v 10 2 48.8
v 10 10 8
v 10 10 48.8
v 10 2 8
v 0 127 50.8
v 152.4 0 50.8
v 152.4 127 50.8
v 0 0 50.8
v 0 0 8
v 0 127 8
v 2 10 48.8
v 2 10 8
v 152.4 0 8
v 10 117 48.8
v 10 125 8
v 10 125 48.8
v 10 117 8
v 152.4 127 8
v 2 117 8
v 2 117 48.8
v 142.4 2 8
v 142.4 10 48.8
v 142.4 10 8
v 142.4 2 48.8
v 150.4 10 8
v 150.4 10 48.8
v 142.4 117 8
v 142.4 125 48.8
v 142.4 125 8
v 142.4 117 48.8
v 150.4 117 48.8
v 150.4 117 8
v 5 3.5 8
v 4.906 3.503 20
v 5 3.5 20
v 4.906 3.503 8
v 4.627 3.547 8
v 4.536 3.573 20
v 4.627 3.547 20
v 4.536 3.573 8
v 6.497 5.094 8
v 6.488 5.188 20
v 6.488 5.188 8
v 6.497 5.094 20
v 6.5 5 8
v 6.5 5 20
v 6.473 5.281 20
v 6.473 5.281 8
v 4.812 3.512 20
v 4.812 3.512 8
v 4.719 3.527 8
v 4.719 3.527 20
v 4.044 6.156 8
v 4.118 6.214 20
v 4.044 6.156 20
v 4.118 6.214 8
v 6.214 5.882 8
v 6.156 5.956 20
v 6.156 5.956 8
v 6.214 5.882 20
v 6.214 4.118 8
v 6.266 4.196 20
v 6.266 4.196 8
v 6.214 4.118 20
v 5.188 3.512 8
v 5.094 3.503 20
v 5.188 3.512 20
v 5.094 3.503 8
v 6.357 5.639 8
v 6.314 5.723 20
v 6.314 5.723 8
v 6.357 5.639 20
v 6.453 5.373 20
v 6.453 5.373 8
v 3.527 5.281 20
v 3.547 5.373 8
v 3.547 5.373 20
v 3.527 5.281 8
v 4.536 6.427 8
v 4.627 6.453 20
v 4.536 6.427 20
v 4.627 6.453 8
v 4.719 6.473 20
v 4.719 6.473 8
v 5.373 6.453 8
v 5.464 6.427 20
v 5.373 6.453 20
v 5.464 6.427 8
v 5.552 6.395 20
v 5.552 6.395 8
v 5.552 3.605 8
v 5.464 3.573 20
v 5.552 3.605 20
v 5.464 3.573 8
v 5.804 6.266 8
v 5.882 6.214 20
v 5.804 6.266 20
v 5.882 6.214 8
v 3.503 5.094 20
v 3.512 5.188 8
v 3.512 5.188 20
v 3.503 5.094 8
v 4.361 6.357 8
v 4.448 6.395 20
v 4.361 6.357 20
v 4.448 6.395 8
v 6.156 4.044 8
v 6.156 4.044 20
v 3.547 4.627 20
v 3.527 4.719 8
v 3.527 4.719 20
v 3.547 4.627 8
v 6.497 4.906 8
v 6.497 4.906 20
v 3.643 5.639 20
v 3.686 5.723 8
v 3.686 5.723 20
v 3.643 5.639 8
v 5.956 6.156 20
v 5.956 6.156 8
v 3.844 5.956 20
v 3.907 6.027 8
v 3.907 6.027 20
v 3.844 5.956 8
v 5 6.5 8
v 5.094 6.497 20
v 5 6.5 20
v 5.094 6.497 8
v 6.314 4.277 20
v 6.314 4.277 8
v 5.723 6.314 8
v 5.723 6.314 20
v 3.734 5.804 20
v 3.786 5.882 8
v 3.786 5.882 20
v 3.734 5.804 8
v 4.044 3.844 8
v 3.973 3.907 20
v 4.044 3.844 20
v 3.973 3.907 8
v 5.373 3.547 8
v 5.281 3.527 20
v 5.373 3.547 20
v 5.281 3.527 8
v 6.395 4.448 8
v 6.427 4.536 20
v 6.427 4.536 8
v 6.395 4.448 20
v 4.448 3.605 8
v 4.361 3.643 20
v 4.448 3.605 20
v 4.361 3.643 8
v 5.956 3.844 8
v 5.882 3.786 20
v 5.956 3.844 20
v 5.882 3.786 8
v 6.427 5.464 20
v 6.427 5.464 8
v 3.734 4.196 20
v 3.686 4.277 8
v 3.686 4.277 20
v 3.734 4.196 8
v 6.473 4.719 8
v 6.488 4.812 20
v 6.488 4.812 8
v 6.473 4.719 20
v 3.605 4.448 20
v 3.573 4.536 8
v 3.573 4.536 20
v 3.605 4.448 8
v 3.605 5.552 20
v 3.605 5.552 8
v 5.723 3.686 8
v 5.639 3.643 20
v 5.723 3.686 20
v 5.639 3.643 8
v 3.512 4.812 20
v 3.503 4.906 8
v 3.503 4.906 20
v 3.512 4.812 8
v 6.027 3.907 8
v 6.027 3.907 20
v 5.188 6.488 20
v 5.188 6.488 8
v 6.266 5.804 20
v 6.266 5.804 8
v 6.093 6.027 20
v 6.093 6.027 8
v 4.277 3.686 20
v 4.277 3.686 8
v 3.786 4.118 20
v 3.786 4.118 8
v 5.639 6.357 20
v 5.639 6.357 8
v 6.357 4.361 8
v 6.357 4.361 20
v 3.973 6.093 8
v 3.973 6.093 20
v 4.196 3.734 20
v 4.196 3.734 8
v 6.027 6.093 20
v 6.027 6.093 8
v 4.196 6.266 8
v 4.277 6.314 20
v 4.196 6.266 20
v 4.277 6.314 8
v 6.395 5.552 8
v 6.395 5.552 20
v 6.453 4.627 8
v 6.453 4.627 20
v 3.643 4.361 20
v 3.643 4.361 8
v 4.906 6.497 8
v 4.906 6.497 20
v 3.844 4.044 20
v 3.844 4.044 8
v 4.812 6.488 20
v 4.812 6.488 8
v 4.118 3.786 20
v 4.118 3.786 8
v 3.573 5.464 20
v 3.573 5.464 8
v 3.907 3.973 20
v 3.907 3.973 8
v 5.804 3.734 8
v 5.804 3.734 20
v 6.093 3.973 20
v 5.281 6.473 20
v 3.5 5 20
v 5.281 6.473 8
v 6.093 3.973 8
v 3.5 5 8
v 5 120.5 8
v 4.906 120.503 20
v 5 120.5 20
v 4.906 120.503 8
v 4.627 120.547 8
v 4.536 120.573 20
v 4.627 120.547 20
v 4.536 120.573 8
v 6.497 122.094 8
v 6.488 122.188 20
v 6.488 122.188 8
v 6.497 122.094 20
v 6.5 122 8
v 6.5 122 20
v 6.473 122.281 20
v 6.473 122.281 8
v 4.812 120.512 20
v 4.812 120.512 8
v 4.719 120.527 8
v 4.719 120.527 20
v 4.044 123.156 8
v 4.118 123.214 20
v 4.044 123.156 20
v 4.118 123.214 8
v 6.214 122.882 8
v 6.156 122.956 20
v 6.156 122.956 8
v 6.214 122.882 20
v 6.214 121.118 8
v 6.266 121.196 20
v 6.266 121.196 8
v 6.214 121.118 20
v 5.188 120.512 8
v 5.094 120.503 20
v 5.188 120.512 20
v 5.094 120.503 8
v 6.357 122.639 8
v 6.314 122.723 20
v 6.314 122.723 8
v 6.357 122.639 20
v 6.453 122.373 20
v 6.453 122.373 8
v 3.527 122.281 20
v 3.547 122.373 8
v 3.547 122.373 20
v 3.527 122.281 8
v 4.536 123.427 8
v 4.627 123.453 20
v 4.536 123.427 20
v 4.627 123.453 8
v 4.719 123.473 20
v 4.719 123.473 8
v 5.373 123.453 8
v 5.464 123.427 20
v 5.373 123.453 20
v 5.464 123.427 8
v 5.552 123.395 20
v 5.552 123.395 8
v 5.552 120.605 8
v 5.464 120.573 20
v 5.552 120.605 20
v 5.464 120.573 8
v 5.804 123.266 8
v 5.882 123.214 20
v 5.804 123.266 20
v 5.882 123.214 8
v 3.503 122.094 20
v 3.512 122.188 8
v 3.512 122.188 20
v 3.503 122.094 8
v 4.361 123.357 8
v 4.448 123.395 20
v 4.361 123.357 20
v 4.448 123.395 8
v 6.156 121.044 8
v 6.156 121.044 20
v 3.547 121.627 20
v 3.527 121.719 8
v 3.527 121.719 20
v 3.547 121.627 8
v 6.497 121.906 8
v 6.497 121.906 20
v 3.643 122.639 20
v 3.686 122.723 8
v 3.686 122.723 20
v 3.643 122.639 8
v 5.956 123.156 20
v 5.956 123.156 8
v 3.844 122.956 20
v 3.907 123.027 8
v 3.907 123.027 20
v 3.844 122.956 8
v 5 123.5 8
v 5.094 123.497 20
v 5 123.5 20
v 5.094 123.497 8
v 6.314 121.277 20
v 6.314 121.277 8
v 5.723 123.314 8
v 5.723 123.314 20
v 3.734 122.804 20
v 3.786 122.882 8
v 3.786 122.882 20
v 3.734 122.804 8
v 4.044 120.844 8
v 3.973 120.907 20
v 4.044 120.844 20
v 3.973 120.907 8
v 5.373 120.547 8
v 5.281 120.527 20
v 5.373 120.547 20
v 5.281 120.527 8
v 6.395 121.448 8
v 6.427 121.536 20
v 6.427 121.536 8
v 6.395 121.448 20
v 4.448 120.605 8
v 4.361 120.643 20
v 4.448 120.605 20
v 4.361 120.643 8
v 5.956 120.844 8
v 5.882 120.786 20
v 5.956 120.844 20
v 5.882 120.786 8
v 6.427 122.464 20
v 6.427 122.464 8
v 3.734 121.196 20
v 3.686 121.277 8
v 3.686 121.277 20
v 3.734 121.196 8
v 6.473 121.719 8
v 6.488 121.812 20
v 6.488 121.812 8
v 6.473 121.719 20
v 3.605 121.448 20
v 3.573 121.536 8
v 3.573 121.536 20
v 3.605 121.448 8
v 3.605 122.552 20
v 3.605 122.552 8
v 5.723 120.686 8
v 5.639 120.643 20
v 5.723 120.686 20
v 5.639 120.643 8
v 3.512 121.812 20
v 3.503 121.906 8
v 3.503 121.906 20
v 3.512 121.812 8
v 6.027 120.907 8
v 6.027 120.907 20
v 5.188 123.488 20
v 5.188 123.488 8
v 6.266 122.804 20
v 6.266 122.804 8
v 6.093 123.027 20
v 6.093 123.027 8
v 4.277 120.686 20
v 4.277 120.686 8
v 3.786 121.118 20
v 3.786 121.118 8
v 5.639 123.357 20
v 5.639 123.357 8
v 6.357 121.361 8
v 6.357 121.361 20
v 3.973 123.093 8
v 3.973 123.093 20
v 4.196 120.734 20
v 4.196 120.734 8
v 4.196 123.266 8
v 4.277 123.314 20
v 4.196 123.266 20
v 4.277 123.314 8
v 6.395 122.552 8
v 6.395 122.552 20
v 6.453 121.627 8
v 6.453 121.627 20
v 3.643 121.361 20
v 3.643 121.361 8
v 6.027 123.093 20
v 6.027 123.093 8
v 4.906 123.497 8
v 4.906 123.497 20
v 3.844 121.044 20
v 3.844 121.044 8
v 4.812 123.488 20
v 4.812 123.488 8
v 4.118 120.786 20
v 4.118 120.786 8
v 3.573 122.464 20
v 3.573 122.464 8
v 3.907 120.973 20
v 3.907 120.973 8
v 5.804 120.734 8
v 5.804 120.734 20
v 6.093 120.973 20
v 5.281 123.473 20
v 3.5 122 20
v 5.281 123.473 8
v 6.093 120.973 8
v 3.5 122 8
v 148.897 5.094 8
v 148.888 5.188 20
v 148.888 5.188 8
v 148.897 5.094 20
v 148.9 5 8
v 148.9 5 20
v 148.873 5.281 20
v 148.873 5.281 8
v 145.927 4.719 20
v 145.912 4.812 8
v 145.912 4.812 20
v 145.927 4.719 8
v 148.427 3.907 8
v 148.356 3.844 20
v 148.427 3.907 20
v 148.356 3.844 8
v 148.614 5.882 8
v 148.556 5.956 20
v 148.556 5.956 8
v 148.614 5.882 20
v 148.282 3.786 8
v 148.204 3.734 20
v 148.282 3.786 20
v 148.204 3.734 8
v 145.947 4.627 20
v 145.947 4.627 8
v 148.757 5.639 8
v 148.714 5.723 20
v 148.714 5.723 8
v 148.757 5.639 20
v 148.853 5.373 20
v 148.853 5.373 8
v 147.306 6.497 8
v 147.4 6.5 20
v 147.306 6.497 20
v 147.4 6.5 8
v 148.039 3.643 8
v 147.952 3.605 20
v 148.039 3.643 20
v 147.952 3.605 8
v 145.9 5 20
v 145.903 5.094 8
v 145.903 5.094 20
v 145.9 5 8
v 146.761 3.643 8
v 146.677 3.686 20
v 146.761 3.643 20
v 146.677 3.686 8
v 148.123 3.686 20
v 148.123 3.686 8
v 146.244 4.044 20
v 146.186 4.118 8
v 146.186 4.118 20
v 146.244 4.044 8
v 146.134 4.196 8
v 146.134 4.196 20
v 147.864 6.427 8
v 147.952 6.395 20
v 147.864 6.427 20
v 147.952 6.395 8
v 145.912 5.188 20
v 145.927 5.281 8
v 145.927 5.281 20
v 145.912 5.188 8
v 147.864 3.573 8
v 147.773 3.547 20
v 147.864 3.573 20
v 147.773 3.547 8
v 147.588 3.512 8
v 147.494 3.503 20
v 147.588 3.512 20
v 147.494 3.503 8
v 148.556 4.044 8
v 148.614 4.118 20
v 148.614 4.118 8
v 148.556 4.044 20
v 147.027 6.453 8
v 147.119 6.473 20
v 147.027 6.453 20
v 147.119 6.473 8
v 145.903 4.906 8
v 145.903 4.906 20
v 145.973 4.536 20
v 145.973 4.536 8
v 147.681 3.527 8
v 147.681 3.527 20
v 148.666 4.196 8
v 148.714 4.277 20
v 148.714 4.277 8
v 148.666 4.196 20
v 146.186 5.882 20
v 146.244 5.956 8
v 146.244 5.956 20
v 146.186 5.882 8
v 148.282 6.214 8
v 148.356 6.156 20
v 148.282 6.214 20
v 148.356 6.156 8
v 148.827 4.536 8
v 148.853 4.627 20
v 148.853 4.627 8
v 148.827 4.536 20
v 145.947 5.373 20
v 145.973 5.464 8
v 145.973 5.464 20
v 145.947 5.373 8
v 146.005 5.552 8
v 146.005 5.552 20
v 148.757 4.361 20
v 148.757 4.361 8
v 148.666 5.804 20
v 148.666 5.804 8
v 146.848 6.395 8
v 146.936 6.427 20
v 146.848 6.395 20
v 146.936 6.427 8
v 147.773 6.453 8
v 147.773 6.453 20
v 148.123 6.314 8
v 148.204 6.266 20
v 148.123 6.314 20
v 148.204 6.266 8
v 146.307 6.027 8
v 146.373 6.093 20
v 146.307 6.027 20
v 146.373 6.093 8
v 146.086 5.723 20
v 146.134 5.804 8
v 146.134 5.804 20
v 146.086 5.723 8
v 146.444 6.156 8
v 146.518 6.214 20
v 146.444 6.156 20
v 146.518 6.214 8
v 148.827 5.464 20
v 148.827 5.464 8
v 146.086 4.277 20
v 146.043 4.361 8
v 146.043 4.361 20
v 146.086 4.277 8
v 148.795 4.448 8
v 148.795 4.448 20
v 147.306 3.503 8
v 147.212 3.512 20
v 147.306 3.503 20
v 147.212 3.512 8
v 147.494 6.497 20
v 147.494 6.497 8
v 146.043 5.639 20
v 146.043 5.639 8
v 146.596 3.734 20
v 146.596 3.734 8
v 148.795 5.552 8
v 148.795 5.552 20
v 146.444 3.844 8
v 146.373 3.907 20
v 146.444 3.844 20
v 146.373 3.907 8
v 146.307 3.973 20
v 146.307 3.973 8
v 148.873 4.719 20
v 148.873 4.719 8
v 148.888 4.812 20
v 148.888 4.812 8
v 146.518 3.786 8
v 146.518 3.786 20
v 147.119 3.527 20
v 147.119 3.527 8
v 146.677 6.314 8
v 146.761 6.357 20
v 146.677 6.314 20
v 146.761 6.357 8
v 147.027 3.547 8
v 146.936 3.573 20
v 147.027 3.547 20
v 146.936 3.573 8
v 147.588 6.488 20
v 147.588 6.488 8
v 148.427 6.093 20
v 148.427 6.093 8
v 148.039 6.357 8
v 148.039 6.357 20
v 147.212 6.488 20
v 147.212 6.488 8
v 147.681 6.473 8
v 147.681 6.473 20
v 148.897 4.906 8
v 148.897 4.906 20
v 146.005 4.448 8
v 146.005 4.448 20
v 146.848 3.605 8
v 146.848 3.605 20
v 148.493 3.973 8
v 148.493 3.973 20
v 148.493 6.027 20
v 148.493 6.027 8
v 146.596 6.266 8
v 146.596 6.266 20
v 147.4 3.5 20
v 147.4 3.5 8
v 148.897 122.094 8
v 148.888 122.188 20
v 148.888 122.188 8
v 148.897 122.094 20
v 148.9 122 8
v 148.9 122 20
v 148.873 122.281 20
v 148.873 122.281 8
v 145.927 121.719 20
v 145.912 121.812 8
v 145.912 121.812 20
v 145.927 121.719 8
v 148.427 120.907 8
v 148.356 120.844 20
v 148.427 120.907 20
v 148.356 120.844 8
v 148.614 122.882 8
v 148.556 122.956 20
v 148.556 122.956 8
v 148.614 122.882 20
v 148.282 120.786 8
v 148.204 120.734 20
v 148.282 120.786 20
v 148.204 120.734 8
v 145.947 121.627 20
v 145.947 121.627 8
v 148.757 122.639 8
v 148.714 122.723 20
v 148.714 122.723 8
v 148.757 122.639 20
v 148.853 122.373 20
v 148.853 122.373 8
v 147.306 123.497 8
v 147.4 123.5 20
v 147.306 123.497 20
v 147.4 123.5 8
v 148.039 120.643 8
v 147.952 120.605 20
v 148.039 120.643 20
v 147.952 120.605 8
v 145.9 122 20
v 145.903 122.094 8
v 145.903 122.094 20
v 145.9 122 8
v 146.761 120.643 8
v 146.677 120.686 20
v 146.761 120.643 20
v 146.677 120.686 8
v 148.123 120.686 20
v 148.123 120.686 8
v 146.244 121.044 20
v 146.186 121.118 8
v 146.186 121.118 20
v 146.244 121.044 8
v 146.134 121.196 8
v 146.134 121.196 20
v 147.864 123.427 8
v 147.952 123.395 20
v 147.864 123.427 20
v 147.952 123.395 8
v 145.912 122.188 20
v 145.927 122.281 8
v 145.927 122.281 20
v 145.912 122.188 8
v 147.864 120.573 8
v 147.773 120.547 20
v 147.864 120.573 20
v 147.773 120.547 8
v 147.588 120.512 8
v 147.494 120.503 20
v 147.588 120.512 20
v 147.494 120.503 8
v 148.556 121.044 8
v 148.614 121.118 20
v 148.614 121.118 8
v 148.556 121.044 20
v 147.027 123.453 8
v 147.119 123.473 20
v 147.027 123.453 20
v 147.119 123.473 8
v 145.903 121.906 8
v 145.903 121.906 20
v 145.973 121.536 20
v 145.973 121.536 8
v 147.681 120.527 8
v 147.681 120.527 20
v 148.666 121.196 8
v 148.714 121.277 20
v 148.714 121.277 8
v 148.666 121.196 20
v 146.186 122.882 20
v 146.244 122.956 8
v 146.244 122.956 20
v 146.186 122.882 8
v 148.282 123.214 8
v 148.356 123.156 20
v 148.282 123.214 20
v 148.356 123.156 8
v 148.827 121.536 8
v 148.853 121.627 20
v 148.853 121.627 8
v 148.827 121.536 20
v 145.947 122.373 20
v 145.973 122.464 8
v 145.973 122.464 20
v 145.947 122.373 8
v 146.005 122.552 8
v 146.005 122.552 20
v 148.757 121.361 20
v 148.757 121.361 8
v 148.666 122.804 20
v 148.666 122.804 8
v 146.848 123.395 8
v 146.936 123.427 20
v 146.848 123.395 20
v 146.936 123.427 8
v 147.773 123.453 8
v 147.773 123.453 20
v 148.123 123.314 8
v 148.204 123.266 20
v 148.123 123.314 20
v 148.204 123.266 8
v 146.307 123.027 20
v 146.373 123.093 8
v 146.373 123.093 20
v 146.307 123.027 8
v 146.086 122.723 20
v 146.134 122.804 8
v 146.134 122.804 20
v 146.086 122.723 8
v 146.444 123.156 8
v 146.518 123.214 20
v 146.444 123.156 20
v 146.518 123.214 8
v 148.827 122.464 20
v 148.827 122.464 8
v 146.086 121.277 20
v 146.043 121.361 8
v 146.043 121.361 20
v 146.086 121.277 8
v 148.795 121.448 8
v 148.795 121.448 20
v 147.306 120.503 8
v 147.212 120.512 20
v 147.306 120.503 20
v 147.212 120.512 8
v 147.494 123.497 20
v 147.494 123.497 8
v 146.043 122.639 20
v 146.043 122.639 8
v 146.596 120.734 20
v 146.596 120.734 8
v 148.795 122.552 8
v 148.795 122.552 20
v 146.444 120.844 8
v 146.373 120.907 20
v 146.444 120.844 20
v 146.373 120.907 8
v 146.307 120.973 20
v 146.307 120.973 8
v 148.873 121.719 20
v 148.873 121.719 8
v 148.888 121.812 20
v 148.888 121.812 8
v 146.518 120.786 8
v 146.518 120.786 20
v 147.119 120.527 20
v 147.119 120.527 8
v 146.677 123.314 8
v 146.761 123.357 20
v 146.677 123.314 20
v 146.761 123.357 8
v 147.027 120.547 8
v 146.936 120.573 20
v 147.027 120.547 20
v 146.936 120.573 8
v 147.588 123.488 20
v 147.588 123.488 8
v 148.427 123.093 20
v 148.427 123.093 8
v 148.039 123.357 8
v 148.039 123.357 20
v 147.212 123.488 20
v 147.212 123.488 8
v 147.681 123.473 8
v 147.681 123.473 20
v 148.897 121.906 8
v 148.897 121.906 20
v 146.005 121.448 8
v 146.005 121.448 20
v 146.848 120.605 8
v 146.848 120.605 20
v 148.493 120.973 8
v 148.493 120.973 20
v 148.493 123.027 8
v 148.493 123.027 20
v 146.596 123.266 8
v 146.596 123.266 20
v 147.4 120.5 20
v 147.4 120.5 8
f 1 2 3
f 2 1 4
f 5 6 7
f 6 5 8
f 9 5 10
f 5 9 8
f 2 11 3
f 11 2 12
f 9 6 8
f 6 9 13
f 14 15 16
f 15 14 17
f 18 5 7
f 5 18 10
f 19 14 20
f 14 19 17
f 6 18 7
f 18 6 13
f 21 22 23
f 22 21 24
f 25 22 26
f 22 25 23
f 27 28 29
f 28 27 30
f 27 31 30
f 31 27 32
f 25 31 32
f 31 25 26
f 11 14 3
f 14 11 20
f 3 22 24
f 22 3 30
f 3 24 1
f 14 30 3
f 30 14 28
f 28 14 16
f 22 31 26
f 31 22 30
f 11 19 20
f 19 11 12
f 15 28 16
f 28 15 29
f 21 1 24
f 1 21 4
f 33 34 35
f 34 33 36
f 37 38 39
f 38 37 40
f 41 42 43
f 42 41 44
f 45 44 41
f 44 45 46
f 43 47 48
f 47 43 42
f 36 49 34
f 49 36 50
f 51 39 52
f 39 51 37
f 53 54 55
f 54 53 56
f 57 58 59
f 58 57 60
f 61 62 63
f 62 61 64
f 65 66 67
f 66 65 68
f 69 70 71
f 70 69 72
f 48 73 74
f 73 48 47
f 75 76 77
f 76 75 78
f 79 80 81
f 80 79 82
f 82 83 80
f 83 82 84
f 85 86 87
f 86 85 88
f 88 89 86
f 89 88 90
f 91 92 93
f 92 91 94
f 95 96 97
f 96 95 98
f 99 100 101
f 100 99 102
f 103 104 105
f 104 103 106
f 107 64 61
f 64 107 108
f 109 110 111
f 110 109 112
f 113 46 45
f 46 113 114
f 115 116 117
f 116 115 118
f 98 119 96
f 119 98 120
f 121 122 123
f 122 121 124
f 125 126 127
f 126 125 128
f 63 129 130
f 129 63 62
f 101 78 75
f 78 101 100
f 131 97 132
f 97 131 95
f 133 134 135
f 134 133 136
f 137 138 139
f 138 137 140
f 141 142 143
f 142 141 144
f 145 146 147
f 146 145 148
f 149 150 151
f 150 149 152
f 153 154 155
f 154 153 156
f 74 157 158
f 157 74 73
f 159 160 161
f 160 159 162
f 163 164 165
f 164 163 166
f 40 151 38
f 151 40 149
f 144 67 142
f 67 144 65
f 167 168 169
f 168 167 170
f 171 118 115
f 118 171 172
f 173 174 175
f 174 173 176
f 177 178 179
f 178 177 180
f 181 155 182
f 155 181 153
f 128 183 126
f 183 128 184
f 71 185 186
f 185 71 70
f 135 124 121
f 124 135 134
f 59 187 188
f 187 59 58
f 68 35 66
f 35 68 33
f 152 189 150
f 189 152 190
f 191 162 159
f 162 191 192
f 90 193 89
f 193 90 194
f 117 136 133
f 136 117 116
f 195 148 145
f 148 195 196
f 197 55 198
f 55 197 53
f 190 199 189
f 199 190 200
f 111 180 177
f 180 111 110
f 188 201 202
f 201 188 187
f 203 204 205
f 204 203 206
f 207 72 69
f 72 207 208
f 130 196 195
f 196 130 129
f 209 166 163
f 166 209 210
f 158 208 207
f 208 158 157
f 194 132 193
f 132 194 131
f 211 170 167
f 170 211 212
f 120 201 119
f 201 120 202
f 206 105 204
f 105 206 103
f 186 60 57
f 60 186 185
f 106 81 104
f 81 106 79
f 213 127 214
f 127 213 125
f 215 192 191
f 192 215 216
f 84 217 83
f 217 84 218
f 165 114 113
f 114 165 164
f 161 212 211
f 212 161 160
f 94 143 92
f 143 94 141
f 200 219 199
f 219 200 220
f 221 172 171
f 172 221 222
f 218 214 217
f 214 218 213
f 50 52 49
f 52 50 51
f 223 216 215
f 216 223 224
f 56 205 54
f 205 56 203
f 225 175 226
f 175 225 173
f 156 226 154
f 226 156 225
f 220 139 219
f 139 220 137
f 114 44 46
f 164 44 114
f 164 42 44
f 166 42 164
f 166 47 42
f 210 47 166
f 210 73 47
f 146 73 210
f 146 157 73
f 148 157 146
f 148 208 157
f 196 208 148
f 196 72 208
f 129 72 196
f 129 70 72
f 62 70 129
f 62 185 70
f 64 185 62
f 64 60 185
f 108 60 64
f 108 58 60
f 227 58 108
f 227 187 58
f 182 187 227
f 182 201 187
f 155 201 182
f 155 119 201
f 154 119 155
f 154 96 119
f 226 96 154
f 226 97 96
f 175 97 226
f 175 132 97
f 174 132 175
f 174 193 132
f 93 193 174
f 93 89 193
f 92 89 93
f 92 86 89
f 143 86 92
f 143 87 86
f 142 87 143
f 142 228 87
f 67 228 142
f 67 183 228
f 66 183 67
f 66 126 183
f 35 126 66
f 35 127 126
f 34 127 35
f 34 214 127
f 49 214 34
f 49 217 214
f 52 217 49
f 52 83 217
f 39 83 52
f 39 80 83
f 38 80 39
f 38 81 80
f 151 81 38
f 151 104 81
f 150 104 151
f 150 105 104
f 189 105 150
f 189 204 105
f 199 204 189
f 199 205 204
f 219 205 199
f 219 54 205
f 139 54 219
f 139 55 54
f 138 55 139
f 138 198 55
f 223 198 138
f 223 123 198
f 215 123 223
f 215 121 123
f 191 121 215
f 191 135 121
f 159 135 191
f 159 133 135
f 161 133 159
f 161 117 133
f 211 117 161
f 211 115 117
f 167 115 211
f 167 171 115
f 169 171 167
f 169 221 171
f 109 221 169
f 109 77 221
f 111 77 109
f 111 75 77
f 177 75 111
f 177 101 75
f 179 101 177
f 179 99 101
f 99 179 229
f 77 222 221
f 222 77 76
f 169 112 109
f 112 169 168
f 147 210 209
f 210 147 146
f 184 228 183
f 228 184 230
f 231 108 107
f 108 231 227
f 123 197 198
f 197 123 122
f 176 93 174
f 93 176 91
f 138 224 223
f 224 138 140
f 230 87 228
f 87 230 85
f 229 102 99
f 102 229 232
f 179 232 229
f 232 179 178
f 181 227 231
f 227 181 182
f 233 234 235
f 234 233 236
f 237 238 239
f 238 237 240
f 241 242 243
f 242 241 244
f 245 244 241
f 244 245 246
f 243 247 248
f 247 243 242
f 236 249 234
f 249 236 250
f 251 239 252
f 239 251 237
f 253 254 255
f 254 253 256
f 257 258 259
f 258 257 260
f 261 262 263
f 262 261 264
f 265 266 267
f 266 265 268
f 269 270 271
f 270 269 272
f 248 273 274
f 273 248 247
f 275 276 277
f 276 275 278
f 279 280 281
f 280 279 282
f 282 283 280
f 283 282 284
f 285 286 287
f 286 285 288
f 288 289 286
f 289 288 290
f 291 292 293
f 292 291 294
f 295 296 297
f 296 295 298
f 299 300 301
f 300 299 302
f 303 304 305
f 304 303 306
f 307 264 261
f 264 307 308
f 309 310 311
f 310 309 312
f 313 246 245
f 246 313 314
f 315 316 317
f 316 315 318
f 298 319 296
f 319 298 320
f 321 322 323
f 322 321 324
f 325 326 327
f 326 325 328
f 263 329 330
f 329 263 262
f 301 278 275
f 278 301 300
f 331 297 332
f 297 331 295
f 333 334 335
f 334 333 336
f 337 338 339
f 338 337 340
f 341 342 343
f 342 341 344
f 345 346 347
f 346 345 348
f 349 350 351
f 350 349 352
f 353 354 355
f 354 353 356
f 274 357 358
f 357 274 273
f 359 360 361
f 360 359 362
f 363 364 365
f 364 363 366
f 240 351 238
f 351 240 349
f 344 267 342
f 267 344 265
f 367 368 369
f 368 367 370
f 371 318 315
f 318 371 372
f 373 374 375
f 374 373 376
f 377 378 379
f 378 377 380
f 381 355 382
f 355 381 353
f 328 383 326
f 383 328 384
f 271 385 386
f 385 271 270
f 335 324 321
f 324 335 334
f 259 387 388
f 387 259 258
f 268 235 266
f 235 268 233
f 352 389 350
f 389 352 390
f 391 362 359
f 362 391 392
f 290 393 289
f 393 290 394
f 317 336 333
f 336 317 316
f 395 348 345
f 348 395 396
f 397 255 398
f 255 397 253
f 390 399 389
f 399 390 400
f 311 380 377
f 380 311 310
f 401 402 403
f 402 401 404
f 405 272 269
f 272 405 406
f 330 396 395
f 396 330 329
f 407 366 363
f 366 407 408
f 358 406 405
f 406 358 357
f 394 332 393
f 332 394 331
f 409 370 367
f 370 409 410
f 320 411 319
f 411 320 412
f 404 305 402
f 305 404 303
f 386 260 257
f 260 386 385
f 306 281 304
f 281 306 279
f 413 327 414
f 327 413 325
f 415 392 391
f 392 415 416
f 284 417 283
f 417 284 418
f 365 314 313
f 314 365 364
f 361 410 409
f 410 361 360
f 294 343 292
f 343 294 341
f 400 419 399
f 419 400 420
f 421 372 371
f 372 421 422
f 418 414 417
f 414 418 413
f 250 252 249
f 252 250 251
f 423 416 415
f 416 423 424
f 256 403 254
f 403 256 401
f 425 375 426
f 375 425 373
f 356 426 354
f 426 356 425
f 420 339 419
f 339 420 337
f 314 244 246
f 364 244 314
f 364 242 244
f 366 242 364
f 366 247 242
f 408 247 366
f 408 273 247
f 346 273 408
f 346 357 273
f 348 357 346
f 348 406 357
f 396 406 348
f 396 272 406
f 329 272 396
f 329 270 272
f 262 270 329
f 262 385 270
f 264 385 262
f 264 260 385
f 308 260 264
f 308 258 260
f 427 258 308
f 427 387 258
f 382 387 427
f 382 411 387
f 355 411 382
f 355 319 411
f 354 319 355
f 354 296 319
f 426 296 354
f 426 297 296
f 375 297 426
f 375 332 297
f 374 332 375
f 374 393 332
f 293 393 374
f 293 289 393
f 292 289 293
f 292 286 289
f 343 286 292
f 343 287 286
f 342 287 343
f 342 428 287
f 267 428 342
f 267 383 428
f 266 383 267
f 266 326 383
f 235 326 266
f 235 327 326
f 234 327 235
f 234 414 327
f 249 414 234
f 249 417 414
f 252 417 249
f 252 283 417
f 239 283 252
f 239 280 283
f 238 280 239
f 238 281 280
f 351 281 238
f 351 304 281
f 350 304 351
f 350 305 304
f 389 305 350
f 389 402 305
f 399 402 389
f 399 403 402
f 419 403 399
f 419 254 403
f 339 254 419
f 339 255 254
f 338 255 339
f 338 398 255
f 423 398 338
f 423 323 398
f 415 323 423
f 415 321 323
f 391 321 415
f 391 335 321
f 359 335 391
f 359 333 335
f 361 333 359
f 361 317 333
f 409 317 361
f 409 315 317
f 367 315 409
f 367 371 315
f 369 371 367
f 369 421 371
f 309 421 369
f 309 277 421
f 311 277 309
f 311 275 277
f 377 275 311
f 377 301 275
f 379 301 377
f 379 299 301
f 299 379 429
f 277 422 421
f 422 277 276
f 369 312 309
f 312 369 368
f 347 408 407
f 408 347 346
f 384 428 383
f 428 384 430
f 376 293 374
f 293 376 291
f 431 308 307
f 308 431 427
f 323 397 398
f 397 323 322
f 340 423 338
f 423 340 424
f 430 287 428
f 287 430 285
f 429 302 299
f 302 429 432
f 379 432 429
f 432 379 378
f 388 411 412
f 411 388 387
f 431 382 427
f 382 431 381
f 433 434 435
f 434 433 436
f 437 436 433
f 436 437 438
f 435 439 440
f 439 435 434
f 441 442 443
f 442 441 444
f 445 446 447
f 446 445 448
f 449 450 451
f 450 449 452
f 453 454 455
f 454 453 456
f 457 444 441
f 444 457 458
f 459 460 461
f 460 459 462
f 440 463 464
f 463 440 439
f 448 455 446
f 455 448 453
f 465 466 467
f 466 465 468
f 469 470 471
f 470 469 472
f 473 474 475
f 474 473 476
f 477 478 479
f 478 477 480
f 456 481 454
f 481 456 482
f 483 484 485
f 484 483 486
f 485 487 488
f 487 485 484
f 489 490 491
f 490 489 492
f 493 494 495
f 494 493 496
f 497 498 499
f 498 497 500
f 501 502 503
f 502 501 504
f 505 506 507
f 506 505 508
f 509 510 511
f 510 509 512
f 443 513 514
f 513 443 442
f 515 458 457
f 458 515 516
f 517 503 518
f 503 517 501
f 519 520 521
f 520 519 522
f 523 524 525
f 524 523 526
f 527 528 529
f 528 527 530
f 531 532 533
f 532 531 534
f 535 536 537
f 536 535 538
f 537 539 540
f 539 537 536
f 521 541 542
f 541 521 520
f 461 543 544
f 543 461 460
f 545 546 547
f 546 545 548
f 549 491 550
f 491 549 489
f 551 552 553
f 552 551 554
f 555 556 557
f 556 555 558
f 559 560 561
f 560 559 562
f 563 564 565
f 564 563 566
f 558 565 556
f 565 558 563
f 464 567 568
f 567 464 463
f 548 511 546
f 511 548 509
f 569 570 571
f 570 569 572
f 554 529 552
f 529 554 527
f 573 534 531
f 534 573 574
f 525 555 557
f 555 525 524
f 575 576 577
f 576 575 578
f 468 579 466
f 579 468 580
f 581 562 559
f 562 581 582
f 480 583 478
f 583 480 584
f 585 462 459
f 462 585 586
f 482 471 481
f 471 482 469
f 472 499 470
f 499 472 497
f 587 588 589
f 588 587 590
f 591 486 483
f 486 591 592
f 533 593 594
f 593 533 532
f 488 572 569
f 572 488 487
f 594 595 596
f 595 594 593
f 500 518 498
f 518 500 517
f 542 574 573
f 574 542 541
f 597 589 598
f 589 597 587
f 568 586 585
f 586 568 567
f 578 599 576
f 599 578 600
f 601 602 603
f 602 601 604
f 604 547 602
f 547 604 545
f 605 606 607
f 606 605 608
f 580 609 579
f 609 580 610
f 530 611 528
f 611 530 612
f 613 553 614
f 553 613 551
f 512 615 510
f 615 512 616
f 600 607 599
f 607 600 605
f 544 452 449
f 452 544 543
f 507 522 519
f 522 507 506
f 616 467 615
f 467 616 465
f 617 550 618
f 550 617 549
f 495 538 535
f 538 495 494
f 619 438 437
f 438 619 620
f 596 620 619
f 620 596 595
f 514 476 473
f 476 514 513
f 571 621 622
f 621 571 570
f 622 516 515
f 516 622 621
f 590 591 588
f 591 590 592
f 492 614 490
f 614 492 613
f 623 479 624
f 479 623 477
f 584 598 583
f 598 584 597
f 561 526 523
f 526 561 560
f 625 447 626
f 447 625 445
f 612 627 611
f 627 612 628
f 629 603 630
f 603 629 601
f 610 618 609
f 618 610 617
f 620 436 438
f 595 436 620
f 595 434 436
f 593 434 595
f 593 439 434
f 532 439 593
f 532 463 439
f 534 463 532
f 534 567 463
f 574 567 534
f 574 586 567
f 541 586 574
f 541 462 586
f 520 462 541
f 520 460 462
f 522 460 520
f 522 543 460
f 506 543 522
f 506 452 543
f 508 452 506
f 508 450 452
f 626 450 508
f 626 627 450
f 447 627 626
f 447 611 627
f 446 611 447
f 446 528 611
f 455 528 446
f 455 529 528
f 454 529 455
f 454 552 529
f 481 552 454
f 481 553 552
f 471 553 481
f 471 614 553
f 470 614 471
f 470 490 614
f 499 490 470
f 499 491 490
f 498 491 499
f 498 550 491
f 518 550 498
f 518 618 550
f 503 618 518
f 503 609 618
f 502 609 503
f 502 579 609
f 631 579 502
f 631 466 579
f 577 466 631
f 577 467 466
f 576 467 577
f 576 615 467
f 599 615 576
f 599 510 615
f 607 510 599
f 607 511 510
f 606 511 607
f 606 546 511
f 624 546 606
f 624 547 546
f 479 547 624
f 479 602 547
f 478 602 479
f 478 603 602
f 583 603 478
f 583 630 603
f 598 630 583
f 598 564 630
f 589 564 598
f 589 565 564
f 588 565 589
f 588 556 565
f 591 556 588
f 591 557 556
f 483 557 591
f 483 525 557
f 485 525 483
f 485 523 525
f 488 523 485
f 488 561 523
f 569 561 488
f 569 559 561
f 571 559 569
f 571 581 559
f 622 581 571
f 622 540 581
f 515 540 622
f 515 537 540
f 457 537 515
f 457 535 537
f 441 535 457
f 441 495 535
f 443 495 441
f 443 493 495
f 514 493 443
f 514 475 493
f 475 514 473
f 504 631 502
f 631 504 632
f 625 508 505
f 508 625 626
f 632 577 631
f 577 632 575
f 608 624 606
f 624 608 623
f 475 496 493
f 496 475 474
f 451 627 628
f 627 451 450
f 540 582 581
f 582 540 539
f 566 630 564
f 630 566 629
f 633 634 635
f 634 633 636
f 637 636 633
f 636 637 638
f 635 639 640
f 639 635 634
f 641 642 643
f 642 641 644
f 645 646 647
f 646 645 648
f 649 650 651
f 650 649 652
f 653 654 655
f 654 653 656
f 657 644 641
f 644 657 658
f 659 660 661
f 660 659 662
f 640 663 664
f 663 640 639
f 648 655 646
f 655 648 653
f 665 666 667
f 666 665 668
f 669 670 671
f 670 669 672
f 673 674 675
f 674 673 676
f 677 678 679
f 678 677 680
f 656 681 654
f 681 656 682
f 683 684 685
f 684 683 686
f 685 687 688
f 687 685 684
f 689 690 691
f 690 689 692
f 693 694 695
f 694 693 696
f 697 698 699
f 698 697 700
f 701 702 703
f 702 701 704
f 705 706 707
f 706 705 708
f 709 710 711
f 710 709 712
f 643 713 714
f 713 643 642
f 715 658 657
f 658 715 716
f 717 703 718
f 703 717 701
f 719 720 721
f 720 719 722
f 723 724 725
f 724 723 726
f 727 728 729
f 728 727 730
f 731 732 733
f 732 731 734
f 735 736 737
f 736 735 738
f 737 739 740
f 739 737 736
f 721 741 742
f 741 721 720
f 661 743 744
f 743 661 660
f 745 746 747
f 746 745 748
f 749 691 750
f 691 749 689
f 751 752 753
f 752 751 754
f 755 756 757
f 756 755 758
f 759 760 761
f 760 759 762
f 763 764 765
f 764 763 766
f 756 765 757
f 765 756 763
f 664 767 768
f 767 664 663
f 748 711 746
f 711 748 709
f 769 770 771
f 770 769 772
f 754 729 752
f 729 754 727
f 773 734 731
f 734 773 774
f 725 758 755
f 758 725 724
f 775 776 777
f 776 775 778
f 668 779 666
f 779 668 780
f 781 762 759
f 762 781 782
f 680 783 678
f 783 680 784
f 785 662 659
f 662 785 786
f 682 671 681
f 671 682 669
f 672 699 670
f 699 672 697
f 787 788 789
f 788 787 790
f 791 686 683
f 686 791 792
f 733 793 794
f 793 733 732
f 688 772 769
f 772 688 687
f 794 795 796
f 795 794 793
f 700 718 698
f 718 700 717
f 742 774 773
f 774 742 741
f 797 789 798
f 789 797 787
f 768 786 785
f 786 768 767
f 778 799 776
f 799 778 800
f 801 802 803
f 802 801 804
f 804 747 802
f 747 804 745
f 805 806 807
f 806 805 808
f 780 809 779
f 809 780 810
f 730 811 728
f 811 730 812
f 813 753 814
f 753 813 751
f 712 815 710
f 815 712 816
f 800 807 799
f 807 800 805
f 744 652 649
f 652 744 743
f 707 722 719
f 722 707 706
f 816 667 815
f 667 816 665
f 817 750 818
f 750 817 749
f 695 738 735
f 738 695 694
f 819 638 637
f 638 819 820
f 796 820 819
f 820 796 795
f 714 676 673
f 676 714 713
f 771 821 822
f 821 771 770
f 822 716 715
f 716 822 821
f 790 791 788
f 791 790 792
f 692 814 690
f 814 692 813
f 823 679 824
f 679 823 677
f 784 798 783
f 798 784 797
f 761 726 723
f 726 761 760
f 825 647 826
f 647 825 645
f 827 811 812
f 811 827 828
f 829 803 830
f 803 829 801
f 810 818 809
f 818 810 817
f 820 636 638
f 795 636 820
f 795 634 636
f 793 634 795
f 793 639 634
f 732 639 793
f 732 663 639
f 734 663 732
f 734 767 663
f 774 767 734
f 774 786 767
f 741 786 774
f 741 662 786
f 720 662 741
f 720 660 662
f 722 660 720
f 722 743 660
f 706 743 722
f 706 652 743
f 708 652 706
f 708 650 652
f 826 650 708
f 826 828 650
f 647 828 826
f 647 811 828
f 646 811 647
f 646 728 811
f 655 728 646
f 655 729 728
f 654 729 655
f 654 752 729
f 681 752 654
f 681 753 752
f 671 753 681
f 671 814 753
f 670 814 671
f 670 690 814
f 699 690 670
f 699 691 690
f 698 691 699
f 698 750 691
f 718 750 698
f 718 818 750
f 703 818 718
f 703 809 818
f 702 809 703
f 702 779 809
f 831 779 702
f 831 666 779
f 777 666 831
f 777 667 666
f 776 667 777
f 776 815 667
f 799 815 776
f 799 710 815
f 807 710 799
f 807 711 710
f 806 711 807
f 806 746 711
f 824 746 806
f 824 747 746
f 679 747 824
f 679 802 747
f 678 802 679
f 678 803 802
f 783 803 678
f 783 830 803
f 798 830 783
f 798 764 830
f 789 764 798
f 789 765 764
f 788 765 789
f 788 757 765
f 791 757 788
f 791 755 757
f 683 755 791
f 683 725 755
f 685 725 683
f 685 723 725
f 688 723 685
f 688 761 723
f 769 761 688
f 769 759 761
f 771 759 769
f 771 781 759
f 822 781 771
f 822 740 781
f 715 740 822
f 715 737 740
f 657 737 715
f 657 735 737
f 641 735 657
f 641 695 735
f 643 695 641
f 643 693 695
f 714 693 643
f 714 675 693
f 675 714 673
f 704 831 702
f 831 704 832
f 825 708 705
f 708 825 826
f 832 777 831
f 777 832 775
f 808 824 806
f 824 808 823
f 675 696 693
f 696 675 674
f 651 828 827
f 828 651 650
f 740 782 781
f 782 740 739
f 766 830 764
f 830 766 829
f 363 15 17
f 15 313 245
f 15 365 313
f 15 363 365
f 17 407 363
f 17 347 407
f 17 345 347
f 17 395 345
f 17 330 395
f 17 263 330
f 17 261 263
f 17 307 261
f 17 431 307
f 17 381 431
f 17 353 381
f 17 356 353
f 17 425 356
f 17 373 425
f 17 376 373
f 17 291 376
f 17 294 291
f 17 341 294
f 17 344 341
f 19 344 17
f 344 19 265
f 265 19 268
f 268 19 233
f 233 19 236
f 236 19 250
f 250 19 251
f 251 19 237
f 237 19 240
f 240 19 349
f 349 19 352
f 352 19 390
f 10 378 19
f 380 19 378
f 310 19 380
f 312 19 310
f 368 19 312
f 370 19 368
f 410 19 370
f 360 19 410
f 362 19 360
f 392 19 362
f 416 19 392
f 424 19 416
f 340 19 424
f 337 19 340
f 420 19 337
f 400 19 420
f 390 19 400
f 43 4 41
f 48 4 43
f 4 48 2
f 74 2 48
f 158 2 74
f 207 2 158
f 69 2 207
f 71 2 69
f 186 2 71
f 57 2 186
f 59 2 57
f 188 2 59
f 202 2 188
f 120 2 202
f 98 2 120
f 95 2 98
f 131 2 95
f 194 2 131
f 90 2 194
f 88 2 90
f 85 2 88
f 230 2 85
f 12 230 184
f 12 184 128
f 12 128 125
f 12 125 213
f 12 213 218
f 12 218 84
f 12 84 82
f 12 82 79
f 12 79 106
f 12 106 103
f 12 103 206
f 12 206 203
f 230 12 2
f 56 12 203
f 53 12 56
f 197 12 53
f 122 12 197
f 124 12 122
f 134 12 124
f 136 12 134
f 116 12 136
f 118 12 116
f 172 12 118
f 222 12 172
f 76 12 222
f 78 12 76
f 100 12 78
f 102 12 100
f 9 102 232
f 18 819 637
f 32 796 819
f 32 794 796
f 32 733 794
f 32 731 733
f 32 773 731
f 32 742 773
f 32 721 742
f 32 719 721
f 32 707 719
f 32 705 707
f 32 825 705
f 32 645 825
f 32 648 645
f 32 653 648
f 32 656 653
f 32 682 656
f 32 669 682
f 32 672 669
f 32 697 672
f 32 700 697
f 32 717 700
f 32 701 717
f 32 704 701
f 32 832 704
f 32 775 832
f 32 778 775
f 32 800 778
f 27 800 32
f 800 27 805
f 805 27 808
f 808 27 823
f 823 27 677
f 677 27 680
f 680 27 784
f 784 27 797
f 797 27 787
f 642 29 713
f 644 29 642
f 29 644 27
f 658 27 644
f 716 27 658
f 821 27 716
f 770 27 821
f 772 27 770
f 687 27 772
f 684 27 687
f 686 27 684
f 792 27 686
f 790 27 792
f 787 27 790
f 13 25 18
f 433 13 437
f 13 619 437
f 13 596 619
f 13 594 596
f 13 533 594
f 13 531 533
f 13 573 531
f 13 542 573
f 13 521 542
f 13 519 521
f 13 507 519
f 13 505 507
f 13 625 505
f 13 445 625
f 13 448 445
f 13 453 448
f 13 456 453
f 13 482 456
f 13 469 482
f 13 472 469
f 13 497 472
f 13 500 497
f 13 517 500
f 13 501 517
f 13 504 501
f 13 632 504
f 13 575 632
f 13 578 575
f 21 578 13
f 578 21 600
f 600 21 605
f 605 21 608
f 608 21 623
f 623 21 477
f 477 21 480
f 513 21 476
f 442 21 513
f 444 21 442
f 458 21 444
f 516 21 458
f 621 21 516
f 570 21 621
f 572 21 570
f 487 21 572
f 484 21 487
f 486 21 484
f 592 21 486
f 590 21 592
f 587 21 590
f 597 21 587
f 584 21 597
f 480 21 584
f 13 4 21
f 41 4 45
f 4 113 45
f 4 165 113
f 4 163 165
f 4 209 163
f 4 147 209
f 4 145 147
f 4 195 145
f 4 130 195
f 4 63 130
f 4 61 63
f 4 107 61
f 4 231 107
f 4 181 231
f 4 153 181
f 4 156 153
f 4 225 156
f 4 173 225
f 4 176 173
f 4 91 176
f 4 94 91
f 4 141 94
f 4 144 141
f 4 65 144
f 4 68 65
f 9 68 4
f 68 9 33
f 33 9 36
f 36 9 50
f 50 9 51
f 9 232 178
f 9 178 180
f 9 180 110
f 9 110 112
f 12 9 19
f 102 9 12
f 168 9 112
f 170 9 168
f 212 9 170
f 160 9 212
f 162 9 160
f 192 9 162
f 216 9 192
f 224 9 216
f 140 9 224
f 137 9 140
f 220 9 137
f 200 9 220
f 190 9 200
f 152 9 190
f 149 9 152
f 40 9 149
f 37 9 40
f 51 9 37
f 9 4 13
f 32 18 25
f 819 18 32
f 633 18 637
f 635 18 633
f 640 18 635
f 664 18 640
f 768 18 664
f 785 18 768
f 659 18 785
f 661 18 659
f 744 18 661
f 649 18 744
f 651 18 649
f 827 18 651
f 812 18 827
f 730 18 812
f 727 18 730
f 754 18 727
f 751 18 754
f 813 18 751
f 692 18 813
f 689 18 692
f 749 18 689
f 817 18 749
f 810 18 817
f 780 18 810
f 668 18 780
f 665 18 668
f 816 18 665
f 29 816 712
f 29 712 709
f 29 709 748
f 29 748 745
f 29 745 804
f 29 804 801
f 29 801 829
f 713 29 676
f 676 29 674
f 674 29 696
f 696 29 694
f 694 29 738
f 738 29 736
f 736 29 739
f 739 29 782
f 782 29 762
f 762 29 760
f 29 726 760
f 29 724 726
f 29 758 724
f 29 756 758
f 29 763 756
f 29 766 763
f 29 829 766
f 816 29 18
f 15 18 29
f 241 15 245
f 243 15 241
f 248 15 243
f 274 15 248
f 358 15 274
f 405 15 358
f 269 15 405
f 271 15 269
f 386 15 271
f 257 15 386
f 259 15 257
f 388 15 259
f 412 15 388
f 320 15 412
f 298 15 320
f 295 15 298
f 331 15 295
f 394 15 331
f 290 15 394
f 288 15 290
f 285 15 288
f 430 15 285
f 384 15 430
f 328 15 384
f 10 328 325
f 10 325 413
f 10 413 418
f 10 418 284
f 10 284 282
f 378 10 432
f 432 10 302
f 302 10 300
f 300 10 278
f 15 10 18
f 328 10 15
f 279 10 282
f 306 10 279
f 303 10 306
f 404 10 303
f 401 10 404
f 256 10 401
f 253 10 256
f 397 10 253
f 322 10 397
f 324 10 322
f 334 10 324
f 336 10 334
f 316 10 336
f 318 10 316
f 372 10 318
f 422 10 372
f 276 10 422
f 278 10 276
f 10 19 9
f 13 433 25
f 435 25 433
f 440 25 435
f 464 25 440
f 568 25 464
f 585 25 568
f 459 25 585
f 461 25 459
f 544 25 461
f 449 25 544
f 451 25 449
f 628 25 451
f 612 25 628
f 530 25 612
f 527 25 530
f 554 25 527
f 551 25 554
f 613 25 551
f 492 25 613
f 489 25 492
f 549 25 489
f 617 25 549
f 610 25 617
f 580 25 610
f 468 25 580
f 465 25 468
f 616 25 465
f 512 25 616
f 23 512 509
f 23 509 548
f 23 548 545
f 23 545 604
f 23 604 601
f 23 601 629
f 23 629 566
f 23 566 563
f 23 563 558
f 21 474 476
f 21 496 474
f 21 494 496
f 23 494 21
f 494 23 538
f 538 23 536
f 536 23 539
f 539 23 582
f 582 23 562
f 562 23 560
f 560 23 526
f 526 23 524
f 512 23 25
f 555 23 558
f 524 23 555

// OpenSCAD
in = 2.54 * 10;
height = 2 * in;
width = 6 * in;
depth = 5 * in;

wall = 2;

thread = 3;
thread_height = 20;
head = 6;
head_height = 6;

pillar = head + wall*2;

bottom_size = head_height+wall;
$fn = 100;

module box() {
for (x=[0, width-pillar]) {
  for (y=[0, depth-pillar]) {
    
    translate([x, y])
    difference () {
      cube([pillar, pillar, height]);
    }
  }
}


difference() {
  cube([width, depth, height]);
  
  translate([wall, wall, wall])
  cube([width-wall*2, depth - wall*2, height - wall*2]);
  
}
}

module box_holes() {
  difference () {
    box();
    
    for (x=[0, width-pillar]) {
      for (y=[0, depth-pillar]) {
       translate([x+head/2+wall, y+head/2+wall, -5])
        cylinder(d=head, h=head_height+5);
       translate([x+head/2+wall, y+head/2+wall])
        cylinder(d=thread, h=thread_height);

      }
    }
  }
}

module top() {
  difference() {
    box_holes();
    translate([-10, -10, -10])
      cube([width+20, depth+20, bottom_size+10]);
  }
}

module bottom() {
  difference() {
    box_holes();
    translate([-10, -10, bottom_size])
      cube([width+20, depth+20, 10000]);
  }
}


top();
//bottom();
//box_holes();
